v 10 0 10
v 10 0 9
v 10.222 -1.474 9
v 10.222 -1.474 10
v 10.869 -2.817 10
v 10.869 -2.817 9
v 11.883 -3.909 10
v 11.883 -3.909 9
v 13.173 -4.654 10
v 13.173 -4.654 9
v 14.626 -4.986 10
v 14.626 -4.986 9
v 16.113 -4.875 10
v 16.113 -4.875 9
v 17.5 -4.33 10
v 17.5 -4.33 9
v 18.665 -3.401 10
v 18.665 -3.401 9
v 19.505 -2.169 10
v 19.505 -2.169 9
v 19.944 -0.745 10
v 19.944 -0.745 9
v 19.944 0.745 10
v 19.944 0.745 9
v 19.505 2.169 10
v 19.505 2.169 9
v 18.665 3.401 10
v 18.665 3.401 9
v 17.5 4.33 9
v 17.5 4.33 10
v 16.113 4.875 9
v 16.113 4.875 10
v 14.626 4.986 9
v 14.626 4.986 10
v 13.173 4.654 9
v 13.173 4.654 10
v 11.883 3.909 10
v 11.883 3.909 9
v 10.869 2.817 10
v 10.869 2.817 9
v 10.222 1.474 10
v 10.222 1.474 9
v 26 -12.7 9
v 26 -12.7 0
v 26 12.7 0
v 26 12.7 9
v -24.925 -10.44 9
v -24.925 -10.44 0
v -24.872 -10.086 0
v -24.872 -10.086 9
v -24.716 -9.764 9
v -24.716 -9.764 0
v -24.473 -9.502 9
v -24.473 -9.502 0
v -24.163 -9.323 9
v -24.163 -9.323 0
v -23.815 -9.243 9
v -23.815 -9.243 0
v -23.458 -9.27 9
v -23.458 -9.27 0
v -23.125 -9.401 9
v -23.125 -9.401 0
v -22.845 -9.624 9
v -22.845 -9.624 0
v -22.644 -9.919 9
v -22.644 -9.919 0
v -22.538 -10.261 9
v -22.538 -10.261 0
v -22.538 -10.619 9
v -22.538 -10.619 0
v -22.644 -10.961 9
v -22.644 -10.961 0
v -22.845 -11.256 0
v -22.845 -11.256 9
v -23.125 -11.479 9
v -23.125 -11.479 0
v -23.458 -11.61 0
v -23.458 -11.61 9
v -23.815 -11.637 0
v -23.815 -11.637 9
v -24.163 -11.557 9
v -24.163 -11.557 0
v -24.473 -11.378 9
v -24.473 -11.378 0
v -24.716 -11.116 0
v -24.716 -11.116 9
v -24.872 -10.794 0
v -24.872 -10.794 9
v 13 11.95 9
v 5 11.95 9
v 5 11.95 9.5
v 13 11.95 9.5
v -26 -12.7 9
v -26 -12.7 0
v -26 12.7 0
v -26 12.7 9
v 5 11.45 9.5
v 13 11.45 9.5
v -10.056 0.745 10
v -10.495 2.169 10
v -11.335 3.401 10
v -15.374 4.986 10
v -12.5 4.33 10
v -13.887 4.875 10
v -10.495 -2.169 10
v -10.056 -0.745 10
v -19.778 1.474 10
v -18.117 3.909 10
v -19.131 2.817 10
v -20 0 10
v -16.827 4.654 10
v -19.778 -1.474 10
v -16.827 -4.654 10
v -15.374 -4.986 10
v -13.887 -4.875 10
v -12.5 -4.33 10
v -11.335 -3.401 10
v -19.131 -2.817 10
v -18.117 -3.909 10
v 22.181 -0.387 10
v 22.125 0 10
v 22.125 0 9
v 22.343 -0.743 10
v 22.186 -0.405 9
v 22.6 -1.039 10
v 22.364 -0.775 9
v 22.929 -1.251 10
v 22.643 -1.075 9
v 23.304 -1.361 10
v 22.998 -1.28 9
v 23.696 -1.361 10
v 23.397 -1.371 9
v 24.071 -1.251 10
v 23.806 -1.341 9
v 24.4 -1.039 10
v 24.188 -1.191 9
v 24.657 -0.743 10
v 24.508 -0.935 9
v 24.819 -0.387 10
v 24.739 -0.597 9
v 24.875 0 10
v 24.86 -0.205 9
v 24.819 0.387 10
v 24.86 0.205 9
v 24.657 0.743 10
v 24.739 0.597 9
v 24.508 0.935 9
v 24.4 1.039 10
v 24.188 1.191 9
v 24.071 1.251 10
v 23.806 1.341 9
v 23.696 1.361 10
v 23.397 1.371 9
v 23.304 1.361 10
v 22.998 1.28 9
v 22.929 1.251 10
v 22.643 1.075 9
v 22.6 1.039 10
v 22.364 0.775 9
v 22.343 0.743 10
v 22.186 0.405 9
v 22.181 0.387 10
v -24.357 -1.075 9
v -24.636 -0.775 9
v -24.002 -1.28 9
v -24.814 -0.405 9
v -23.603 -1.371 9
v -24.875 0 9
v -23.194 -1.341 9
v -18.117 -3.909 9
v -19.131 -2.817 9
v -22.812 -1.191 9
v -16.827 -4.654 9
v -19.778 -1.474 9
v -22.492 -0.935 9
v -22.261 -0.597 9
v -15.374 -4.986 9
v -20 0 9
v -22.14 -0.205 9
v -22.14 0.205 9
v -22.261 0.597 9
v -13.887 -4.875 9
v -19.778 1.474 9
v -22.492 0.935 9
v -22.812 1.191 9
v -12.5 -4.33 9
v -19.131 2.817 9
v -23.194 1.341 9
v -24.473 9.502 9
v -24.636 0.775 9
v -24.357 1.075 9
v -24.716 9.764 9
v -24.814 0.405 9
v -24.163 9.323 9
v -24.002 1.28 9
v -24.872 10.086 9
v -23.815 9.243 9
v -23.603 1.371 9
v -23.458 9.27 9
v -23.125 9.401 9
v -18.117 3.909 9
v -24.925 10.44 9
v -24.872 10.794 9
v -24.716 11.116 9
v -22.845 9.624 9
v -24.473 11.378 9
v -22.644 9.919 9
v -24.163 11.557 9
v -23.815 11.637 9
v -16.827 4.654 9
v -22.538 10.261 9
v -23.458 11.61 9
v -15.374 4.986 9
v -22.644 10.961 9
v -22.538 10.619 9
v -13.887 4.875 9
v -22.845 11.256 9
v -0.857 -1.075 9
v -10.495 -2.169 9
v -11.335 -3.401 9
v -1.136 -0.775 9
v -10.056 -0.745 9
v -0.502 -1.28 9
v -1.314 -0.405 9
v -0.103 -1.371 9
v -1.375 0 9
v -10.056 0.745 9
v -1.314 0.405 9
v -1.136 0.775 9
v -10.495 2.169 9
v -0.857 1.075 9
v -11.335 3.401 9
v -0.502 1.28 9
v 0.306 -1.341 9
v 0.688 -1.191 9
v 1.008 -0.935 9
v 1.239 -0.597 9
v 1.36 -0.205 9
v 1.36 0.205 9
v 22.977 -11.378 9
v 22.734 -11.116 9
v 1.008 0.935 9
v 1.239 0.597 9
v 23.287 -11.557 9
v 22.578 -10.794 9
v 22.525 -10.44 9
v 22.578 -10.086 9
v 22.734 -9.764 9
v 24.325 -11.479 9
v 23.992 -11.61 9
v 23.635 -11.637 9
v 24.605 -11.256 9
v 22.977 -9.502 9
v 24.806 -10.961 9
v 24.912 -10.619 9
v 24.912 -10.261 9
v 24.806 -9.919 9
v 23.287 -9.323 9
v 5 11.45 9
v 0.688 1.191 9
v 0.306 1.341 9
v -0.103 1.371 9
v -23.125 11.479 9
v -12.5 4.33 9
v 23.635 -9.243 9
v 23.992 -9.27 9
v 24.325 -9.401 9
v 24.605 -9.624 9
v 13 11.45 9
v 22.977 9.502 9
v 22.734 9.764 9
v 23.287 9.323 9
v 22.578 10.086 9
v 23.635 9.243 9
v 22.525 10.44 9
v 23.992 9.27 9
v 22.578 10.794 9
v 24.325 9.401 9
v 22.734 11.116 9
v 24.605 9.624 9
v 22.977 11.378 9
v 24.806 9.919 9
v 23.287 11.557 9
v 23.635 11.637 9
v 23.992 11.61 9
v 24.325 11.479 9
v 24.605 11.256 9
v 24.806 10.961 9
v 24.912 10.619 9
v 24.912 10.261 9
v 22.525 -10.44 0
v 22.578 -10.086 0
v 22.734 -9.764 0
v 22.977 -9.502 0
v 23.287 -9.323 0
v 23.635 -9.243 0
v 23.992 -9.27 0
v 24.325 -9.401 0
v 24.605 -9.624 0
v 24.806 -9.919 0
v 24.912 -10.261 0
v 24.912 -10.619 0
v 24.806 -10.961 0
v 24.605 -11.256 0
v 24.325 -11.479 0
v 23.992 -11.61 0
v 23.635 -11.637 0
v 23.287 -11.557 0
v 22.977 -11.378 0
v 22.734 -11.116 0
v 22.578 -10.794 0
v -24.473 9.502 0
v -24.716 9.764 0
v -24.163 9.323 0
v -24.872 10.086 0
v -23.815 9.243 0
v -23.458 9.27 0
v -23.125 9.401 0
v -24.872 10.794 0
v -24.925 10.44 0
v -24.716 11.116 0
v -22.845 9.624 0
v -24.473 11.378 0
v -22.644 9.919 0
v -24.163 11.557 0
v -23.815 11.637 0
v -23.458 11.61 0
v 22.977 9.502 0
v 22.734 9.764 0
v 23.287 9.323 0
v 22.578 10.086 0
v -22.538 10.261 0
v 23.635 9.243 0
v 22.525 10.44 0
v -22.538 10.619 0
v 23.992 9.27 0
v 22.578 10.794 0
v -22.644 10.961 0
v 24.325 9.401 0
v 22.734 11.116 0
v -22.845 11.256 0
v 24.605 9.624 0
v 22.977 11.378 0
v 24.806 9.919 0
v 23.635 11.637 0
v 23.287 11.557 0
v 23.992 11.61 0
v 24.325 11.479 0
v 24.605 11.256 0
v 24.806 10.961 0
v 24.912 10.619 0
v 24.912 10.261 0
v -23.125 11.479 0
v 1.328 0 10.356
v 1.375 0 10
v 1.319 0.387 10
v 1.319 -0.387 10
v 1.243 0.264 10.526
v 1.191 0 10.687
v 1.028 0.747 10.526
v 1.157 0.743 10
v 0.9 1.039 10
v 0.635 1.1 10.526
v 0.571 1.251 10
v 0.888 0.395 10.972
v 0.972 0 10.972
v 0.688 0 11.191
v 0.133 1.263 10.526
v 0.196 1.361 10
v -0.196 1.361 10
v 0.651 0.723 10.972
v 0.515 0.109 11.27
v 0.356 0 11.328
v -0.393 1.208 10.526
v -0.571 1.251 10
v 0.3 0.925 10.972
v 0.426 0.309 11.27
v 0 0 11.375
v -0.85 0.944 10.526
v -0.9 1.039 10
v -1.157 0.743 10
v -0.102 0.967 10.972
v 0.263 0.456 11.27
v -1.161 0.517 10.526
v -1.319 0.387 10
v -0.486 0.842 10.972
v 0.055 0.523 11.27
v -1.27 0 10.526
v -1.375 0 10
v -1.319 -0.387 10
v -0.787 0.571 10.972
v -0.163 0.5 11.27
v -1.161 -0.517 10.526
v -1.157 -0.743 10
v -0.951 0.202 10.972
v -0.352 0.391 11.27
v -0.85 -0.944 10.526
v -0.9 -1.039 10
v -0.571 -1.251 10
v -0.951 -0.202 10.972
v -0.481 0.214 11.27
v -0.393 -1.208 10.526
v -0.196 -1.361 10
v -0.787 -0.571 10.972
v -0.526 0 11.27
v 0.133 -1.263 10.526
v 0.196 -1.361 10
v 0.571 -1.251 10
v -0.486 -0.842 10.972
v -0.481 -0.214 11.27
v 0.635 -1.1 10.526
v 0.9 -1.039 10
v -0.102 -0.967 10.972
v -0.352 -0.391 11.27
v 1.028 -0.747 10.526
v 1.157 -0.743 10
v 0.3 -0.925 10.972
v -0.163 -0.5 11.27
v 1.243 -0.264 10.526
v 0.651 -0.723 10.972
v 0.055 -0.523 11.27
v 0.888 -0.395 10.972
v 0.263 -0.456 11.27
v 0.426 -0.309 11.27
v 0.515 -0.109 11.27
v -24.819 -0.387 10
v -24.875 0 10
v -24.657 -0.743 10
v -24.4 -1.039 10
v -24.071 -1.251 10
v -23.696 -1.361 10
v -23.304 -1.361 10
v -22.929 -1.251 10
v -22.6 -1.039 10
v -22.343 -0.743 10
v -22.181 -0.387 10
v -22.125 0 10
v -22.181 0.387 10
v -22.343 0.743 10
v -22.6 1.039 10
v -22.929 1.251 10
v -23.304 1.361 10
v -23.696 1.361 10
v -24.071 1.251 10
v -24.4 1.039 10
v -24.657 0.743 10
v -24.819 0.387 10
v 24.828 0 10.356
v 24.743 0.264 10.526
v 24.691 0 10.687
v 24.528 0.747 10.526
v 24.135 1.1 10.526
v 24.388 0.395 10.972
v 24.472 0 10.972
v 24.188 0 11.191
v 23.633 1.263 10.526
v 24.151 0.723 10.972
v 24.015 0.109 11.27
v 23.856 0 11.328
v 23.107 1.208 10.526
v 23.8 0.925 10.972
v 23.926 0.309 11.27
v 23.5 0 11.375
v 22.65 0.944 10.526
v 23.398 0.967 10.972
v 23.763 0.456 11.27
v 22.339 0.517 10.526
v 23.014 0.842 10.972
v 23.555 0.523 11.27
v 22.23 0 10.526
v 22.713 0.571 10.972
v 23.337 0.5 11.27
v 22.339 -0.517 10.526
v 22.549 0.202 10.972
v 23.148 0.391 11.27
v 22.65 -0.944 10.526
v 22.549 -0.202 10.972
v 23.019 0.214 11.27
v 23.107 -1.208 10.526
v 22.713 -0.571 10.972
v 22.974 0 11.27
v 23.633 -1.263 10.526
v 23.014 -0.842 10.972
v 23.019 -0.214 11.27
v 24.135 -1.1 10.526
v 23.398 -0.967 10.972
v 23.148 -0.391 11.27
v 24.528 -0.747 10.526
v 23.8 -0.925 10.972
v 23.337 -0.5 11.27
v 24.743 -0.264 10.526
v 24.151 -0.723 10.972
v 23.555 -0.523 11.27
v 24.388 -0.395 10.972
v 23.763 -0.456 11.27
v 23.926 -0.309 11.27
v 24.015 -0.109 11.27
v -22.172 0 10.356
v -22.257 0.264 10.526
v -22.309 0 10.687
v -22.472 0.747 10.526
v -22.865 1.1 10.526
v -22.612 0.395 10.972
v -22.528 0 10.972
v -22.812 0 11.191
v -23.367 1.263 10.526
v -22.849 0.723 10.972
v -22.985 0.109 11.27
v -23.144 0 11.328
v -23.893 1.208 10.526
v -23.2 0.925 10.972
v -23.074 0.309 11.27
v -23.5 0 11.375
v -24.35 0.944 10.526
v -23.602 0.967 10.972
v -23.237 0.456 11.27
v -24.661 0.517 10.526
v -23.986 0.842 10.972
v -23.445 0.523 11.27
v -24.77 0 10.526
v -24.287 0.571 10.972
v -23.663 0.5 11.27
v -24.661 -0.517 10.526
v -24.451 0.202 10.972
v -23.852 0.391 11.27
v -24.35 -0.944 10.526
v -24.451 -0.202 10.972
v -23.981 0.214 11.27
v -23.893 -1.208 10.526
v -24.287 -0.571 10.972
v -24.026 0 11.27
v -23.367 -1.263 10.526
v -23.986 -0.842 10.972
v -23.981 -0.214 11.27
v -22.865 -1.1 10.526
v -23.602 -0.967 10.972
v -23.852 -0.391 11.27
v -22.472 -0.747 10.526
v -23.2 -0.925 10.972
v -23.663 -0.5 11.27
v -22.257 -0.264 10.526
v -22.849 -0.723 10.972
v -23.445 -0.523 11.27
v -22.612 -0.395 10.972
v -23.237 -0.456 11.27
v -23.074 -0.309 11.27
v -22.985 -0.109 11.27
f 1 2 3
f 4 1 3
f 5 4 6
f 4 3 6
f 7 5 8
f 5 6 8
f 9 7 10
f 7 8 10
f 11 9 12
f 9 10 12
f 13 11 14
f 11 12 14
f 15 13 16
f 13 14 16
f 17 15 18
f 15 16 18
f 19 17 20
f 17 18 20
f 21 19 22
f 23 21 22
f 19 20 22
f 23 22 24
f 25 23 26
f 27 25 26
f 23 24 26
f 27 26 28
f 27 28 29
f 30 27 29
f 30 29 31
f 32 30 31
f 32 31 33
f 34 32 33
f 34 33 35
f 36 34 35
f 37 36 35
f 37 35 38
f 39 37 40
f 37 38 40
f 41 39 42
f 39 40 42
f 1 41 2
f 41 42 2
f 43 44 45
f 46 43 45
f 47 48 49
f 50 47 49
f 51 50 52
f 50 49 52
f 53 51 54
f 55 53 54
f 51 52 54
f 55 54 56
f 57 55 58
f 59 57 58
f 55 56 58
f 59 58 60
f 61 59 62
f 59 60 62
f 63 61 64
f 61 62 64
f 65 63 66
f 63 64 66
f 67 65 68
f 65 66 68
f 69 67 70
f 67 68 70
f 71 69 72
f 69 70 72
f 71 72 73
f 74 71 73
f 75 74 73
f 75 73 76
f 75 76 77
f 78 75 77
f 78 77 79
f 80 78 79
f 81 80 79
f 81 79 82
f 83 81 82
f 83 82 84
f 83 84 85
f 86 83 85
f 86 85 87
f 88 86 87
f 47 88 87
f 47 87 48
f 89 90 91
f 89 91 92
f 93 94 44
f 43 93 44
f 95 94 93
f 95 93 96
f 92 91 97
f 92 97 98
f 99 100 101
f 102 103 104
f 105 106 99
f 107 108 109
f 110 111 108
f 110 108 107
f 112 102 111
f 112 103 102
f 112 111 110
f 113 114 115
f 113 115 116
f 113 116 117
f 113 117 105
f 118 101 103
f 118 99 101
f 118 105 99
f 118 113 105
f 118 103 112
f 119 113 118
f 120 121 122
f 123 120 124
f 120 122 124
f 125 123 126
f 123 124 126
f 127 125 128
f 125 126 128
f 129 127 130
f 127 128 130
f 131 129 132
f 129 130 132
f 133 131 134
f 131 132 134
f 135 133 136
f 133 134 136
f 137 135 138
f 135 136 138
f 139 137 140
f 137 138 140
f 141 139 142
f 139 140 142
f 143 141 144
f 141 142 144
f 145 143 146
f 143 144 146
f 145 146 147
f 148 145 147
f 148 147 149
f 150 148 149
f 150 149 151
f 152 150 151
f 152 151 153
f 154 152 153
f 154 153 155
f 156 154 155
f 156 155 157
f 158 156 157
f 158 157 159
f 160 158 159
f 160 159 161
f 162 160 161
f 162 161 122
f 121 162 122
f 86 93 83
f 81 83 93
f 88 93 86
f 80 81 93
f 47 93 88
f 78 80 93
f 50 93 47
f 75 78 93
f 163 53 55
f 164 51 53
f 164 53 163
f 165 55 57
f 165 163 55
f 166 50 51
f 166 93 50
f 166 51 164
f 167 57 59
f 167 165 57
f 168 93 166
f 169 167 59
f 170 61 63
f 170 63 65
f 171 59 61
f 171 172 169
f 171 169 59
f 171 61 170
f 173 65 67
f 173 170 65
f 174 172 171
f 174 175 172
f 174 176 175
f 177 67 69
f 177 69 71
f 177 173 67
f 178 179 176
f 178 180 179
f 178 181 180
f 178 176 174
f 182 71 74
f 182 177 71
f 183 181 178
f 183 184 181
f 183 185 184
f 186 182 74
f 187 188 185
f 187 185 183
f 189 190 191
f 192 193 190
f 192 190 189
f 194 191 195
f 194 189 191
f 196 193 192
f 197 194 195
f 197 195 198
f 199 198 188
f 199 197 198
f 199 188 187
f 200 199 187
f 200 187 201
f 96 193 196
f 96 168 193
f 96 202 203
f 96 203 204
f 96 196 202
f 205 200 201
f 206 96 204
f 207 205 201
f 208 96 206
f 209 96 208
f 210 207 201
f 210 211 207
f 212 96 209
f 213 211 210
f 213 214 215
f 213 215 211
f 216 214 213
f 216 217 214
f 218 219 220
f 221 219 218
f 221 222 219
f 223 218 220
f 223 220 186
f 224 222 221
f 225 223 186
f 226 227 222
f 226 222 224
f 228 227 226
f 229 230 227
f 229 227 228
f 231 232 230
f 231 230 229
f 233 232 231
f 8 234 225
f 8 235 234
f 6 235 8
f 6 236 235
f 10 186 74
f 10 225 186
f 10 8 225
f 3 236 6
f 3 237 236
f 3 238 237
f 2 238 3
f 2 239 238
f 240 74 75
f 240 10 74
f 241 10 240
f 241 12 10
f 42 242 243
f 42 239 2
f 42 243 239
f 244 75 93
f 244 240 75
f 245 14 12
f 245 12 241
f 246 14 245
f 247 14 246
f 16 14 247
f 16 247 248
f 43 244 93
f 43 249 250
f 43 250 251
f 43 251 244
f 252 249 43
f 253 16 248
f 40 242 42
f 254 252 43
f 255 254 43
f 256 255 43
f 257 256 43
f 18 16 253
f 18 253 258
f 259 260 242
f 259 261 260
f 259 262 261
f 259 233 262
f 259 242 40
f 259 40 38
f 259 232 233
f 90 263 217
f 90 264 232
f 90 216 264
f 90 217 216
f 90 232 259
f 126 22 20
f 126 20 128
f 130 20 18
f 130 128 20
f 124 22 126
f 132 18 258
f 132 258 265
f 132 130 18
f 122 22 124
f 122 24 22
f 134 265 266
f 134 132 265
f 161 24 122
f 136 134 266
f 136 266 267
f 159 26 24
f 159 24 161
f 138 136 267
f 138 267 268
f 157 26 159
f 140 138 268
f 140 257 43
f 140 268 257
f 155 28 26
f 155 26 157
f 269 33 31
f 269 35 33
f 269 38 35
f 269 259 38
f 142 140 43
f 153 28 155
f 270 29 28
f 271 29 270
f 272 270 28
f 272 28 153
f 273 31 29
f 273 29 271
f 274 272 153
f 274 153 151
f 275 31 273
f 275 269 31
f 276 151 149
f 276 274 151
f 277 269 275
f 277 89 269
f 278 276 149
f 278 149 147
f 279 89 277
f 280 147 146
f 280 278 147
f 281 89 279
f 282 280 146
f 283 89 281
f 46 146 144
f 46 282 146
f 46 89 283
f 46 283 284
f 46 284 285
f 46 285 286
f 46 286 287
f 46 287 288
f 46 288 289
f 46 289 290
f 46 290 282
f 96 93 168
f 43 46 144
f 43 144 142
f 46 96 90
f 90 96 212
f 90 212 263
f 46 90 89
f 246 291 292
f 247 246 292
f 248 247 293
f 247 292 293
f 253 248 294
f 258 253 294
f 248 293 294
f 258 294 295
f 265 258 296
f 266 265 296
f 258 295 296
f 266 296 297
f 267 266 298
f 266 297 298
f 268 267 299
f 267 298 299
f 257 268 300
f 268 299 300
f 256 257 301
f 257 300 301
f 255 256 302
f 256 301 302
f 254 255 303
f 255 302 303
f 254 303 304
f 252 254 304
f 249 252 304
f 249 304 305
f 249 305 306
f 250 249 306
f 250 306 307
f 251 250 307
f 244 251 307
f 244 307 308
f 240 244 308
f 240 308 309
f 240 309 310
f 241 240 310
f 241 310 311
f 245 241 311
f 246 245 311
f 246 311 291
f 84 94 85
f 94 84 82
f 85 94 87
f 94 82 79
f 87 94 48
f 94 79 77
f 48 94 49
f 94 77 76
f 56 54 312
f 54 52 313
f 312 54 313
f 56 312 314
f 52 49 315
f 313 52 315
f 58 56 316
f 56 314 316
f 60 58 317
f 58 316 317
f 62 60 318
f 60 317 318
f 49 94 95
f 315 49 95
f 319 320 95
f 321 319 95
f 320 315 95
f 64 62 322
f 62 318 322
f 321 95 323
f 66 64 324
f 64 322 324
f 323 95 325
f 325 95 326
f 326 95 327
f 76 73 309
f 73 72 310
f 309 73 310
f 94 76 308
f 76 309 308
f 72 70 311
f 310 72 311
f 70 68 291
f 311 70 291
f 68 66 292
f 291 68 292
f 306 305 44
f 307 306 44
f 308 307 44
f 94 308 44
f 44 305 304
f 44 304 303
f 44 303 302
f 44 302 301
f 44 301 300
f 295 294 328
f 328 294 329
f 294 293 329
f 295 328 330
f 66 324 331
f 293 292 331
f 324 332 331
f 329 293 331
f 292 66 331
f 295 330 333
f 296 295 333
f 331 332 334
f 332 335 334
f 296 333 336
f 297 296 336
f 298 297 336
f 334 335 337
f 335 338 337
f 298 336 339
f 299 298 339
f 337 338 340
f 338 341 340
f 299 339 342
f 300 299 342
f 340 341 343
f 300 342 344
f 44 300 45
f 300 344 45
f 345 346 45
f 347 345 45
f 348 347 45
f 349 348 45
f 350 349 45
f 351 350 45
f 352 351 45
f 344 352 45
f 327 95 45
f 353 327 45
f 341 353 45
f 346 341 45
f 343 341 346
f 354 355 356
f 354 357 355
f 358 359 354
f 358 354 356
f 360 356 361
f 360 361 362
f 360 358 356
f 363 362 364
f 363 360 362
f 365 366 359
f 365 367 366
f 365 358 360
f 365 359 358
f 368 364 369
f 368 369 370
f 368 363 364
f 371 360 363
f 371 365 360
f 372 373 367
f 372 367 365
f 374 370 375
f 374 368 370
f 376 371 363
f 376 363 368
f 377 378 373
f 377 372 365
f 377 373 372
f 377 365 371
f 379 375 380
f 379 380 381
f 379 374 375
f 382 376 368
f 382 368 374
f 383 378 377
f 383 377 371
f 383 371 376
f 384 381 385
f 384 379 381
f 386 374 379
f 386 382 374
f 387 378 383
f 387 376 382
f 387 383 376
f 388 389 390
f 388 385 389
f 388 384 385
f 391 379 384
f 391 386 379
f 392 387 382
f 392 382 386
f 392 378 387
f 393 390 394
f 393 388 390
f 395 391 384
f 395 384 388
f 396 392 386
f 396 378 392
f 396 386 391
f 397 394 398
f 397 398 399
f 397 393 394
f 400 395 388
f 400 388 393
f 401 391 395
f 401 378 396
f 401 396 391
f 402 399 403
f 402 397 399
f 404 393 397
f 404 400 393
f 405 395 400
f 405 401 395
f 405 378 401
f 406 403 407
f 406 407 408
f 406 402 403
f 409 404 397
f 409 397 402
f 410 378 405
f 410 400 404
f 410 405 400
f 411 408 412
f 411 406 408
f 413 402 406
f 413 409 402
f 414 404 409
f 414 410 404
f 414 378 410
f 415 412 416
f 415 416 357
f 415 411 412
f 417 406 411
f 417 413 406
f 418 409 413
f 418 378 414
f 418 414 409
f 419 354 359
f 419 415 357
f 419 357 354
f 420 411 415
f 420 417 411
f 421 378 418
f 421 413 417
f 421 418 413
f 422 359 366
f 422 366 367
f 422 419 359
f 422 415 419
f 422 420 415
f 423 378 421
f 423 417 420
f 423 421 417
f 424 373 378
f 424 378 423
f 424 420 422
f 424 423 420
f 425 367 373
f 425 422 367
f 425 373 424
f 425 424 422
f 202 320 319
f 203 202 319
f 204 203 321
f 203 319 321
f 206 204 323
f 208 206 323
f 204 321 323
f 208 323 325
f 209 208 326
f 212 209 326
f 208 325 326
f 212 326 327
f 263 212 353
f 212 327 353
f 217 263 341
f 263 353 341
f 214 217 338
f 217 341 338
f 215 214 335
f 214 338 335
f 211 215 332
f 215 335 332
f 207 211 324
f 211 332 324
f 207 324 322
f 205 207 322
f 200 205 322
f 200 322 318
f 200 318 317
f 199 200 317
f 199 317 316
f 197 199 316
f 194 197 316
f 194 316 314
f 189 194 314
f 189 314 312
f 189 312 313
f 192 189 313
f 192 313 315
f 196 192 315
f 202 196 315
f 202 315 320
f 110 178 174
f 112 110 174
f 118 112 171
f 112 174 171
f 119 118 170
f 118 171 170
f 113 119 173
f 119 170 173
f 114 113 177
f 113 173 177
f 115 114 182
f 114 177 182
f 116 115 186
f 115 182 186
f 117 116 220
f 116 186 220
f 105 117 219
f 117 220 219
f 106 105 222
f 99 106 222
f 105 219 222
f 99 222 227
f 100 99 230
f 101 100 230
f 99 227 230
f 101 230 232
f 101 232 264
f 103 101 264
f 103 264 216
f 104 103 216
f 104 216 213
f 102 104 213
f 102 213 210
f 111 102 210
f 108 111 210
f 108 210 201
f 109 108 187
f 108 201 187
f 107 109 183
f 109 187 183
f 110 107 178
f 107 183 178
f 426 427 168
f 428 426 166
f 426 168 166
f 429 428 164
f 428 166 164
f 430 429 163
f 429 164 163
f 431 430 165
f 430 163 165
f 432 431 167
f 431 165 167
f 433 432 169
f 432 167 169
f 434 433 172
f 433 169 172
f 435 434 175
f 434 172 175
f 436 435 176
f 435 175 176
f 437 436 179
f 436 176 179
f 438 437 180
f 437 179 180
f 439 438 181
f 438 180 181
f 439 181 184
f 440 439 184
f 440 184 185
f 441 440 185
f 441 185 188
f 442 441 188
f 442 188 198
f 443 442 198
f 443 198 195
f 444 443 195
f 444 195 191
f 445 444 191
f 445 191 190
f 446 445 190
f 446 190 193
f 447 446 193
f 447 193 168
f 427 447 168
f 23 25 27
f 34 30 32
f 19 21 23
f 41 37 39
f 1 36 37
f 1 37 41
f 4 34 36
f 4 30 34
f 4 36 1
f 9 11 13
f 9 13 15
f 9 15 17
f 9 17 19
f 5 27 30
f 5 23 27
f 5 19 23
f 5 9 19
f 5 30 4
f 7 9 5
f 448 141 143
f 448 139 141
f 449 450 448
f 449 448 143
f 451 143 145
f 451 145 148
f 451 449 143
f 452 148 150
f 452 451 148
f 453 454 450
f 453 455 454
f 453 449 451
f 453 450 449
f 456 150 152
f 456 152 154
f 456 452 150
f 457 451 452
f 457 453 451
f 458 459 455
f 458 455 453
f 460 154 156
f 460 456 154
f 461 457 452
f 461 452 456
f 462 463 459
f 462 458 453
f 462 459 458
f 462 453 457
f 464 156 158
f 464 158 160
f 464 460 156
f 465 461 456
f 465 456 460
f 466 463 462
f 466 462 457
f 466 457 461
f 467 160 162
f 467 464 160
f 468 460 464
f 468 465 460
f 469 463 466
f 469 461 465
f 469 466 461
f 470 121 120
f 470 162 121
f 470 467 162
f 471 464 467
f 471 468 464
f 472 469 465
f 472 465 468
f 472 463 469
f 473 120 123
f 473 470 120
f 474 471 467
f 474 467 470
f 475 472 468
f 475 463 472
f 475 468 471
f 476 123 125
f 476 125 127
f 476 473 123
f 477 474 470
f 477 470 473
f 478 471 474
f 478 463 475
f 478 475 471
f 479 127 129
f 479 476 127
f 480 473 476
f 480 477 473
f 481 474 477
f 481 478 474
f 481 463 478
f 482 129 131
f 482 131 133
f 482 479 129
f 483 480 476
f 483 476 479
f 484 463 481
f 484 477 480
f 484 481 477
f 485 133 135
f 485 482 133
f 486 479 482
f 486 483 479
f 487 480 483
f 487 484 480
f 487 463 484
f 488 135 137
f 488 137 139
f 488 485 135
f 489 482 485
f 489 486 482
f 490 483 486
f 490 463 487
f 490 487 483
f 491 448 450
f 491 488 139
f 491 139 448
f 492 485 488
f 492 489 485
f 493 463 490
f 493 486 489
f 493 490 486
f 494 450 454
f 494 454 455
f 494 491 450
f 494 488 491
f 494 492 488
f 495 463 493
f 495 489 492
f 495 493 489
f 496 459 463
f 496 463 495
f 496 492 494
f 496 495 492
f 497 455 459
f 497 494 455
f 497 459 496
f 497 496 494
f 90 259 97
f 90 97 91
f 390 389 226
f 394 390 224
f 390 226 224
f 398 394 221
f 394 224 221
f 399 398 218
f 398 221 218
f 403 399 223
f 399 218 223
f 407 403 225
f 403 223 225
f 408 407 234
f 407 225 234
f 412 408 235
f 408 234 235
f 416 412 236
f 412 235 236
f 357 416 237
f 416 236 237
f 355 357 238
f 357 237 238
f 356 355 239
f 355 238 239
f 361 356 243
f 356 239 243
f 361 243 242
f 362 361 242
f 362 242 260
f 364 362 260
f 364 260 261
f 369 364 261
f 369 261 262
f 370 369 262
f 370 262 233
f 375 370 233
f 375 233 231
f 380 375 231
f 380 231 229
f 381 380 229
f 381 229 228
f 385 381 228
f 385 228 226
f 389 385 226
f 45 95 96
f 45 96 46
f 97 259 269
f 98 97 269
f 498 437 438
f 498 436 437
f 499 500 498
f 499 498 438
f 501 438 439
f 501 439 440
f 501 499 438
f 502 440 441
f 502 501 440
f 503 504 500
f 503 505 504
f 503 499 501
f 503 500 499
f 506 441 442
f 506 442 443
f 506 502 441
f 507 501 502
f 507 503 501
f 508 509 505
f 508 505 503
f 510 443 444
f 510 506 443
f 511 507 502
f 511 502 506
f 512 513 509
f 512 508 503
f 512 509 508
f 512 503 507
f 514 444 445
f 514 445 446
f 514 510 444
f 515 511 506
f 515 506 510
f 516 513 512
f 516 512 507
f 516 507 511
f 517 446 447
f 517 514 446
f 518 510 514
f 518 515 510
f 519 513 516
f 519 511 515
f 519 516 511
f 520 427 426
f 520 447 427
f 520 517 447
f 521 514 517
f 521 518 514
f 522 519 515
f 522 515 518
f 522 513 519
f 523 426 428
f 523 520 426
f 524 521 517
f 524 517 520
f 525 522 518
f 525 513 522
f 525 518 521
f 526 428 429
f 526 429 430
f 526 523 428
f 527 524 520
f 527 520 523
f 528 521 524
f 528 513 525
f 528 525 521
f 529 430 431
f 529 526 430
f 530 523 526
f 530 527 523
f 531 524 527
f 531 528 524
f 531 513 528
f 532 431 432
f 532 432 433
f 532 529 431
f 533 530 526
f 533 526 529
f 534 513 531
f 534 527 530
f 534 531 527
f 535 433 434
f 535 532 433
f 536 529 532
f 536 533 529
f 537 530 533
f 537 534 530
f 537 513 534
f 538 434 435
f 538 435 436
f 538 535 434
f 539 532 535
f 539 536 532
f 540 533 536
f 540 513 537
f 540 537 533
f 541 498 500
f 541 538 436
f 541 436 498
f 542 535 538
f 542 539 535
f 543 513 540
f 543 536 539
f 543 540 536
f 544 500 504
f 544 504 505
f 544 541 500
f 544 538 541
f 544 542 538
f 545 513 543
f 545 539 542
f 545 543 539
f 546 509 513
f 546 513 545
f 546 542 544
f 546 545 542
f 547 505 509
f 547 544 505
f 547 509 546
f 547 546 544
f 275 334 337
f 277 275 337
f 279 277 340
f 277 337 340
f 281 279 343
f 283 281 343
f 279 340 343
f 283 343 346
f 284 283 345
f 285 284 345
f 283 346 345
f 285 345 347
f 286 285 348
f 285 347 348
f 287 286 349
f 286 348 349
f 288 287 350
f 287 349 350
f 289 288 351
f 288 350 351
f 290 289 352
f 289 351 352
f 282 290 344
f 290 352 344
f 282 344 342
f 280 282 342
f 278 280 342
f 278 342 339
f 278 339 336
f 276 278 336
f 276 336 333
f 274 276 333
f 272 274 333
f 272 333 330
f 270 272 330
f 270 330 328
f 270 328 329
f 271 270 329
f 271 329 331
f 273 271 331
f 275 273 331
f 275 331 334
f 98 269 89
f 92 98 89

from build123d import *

# Parameters (mm, degrees)
SCHIZZO1_W                   = 52
SCHIZZO1_H                   = 25.4
ESTRUSIONE_ESTRUSIONE1_DEPTH = 9
FORO_PER_VITE_M2_1_D         = 2.4
SCHIZZO5_R                   = 5
ESTRUSIONE_ESTRUSIONE2_DEPTH = 1
SCHIZZO6_W                   = 8
SCHIZZO6_H                   = 0.5
ESTRUSIONE_ESTRUSIONE3_DEPTH = 0.5
SCHIZZO7_R                   = 1.375
ESTRUSIONE_ESTRUSIONE4_DEPTH = 1
CUPOLA1_FACE_RADIUS          = 1.375
CUPOLA1_HEIGHT               = 1.375
CUPOLA2_FACE_RADIUS          = 1.375
CUPOLA2_HEIGHT               = 1.375
CUPOLA3_FACE_RADIUS          = 1.375
CUPOLA3_HEIGHT               = 1.375


with BuildPart() as part:
    # Schizzo1 → Estrusione-Estrusione1 (new body)
    with BuildSketch(Plane.XY):
        Rectangle(SCHIZZO1_W, SCHIZZO1_H)
    extrude(amount=ESTRUSIONE_ESTRUSIONE1_DEPTH)

    # Foro per Vite M2-1 (through all)
    with Locations(Plane.XY.offset(9)):
        with Locations((-23.725, 10.44), (-23.725, -10.44), (23.725, -10.44), (23.725, 10.44)):
            Hole(FORO_PER_VITE_M2_1_D / 2)

    # Schizzo5 → Estrusione-Estrusione2 (add)
    with BuildSketch(Plane.XY.offset(9)):
        with Locations(Location((-15, 0, 0), (0, 0, 180))):
            Circle(SCHIZZO5_R)
        with Locations(Location((15, 0, 0), (0, 0, 180))):
            Circle(SCHIZZO5_R)
    extrude(amount=ESTRUSIONE_ESTRUSIONE2_DEPTH)

    # Schizzo6 → Estrusione-Estrusione3 (add)
    with BuildSketch(Plane.XY.offset(9)):
        with Locations((9, 11.7)):
            Rectangle(SCHIZZO6_W, SCHIZZO6_H)
    extrude(amount=ESTRUSIONE_ESTRUSIONE3_DEPTH)

    # Schizzo7 → Estrusione-Estrusione4 (add)
    with BuildSketch(Plane.XY.offset(9)):
        with Locations(Location((-23.5, 0, 0), (0, 0, 180))):
            Circle(SCHIZZO7_R)
        with Locations(Location((23.5, 0, 0), (0, 0, 180))):
            Circle(SCHIZZO7_R)
        with Locations(Location((0, 0, 0), (0, 0, 180))):
            Circle(SCHIZZO7_R)
    extrude(amount=ESTRUSIONE_ESTRUSIONE4_DEPTH)

    # Cupola1: a dome of height H over a round flat face of radius A is a cap of a sphere of radius (A * A + H * H) / (2 * H)
    cupola1_r = (CUPOLA1_FACE_RADIUS * CUPOLA1_FACE_RADIUS + CUPOLA1_HEIGHT * CUPOLA1_HEIGHT) / (2 * CUPOLA1_HEIGHT)
    cupola1_base = Plane((-23.5, 0, 10), z_dir=(0, 0, 1))
    with Locations(cupola1_base.offset(CUPOLA1_HEIGHT - cupola1_r)):
        cupola1_ball = Sphere(cupola1_r, mode=Mode.PRIVATE)
    add(split(cupola1_ball, bisect_by=cupola1_base, keep=Keep.TOP, mode=Mode.PRIVATE))

    # Cupola2: a dome of height H over a round flat face of radius A is a cap of a sphere of radius (A * A + H * H) / (2 * H)
    cupola2_r = (CUPOLA2_FACE_RADIUS * CUPOLA2_FACE_RADIUS + CUPOLA2_HEIGHT * CUPOLA2_HEIGHT) / (2 * CUPOLA2_HEIGHT)
    cupola2_base = Plane((0, 0, 10), z_dir=(0, 0, 1))
    with Locations(cupola2_base.offset(CUPOLA2_HEIGHT - cupola2_r)):
        cupola2_ball = Sphere(cupola2_r, mode=Mode.PRIVATE)
    add(split(cupola2_ball, bisect_by=cupola2_base, keep=Keep.TOP, mode=Mode.PRIVATE))

    # Cupola3: a dome of height H over a round flat face of radius A is a cap of a sphere of radius (A * A + H * H) / (2 * H)
    cupola3_r = (CUPOLA3_FACE_RADIUS * CUPOLA3_FACE_RADIUS + CUPOLA3_HEIGHT * CUPOLA3_HEIGHT) / (2 * CUPOLA3_HEIGHT)
    cupola3_base = Plane((23.5, 0, 10), z_dir=(0, 0, 1))
    with Locations(cupola3_base.offset(CUPOLA3_HEIGHT - cupola3_r)):
        cupola3_ball = Sphere(cupola3_r, mode=Mode.PRIVATE)
    add(split(cupola3_ball, bisect_by=cupola3_base, keep=Keep.TOP, mode=Mode.PRIVATE))


solid = part.part
